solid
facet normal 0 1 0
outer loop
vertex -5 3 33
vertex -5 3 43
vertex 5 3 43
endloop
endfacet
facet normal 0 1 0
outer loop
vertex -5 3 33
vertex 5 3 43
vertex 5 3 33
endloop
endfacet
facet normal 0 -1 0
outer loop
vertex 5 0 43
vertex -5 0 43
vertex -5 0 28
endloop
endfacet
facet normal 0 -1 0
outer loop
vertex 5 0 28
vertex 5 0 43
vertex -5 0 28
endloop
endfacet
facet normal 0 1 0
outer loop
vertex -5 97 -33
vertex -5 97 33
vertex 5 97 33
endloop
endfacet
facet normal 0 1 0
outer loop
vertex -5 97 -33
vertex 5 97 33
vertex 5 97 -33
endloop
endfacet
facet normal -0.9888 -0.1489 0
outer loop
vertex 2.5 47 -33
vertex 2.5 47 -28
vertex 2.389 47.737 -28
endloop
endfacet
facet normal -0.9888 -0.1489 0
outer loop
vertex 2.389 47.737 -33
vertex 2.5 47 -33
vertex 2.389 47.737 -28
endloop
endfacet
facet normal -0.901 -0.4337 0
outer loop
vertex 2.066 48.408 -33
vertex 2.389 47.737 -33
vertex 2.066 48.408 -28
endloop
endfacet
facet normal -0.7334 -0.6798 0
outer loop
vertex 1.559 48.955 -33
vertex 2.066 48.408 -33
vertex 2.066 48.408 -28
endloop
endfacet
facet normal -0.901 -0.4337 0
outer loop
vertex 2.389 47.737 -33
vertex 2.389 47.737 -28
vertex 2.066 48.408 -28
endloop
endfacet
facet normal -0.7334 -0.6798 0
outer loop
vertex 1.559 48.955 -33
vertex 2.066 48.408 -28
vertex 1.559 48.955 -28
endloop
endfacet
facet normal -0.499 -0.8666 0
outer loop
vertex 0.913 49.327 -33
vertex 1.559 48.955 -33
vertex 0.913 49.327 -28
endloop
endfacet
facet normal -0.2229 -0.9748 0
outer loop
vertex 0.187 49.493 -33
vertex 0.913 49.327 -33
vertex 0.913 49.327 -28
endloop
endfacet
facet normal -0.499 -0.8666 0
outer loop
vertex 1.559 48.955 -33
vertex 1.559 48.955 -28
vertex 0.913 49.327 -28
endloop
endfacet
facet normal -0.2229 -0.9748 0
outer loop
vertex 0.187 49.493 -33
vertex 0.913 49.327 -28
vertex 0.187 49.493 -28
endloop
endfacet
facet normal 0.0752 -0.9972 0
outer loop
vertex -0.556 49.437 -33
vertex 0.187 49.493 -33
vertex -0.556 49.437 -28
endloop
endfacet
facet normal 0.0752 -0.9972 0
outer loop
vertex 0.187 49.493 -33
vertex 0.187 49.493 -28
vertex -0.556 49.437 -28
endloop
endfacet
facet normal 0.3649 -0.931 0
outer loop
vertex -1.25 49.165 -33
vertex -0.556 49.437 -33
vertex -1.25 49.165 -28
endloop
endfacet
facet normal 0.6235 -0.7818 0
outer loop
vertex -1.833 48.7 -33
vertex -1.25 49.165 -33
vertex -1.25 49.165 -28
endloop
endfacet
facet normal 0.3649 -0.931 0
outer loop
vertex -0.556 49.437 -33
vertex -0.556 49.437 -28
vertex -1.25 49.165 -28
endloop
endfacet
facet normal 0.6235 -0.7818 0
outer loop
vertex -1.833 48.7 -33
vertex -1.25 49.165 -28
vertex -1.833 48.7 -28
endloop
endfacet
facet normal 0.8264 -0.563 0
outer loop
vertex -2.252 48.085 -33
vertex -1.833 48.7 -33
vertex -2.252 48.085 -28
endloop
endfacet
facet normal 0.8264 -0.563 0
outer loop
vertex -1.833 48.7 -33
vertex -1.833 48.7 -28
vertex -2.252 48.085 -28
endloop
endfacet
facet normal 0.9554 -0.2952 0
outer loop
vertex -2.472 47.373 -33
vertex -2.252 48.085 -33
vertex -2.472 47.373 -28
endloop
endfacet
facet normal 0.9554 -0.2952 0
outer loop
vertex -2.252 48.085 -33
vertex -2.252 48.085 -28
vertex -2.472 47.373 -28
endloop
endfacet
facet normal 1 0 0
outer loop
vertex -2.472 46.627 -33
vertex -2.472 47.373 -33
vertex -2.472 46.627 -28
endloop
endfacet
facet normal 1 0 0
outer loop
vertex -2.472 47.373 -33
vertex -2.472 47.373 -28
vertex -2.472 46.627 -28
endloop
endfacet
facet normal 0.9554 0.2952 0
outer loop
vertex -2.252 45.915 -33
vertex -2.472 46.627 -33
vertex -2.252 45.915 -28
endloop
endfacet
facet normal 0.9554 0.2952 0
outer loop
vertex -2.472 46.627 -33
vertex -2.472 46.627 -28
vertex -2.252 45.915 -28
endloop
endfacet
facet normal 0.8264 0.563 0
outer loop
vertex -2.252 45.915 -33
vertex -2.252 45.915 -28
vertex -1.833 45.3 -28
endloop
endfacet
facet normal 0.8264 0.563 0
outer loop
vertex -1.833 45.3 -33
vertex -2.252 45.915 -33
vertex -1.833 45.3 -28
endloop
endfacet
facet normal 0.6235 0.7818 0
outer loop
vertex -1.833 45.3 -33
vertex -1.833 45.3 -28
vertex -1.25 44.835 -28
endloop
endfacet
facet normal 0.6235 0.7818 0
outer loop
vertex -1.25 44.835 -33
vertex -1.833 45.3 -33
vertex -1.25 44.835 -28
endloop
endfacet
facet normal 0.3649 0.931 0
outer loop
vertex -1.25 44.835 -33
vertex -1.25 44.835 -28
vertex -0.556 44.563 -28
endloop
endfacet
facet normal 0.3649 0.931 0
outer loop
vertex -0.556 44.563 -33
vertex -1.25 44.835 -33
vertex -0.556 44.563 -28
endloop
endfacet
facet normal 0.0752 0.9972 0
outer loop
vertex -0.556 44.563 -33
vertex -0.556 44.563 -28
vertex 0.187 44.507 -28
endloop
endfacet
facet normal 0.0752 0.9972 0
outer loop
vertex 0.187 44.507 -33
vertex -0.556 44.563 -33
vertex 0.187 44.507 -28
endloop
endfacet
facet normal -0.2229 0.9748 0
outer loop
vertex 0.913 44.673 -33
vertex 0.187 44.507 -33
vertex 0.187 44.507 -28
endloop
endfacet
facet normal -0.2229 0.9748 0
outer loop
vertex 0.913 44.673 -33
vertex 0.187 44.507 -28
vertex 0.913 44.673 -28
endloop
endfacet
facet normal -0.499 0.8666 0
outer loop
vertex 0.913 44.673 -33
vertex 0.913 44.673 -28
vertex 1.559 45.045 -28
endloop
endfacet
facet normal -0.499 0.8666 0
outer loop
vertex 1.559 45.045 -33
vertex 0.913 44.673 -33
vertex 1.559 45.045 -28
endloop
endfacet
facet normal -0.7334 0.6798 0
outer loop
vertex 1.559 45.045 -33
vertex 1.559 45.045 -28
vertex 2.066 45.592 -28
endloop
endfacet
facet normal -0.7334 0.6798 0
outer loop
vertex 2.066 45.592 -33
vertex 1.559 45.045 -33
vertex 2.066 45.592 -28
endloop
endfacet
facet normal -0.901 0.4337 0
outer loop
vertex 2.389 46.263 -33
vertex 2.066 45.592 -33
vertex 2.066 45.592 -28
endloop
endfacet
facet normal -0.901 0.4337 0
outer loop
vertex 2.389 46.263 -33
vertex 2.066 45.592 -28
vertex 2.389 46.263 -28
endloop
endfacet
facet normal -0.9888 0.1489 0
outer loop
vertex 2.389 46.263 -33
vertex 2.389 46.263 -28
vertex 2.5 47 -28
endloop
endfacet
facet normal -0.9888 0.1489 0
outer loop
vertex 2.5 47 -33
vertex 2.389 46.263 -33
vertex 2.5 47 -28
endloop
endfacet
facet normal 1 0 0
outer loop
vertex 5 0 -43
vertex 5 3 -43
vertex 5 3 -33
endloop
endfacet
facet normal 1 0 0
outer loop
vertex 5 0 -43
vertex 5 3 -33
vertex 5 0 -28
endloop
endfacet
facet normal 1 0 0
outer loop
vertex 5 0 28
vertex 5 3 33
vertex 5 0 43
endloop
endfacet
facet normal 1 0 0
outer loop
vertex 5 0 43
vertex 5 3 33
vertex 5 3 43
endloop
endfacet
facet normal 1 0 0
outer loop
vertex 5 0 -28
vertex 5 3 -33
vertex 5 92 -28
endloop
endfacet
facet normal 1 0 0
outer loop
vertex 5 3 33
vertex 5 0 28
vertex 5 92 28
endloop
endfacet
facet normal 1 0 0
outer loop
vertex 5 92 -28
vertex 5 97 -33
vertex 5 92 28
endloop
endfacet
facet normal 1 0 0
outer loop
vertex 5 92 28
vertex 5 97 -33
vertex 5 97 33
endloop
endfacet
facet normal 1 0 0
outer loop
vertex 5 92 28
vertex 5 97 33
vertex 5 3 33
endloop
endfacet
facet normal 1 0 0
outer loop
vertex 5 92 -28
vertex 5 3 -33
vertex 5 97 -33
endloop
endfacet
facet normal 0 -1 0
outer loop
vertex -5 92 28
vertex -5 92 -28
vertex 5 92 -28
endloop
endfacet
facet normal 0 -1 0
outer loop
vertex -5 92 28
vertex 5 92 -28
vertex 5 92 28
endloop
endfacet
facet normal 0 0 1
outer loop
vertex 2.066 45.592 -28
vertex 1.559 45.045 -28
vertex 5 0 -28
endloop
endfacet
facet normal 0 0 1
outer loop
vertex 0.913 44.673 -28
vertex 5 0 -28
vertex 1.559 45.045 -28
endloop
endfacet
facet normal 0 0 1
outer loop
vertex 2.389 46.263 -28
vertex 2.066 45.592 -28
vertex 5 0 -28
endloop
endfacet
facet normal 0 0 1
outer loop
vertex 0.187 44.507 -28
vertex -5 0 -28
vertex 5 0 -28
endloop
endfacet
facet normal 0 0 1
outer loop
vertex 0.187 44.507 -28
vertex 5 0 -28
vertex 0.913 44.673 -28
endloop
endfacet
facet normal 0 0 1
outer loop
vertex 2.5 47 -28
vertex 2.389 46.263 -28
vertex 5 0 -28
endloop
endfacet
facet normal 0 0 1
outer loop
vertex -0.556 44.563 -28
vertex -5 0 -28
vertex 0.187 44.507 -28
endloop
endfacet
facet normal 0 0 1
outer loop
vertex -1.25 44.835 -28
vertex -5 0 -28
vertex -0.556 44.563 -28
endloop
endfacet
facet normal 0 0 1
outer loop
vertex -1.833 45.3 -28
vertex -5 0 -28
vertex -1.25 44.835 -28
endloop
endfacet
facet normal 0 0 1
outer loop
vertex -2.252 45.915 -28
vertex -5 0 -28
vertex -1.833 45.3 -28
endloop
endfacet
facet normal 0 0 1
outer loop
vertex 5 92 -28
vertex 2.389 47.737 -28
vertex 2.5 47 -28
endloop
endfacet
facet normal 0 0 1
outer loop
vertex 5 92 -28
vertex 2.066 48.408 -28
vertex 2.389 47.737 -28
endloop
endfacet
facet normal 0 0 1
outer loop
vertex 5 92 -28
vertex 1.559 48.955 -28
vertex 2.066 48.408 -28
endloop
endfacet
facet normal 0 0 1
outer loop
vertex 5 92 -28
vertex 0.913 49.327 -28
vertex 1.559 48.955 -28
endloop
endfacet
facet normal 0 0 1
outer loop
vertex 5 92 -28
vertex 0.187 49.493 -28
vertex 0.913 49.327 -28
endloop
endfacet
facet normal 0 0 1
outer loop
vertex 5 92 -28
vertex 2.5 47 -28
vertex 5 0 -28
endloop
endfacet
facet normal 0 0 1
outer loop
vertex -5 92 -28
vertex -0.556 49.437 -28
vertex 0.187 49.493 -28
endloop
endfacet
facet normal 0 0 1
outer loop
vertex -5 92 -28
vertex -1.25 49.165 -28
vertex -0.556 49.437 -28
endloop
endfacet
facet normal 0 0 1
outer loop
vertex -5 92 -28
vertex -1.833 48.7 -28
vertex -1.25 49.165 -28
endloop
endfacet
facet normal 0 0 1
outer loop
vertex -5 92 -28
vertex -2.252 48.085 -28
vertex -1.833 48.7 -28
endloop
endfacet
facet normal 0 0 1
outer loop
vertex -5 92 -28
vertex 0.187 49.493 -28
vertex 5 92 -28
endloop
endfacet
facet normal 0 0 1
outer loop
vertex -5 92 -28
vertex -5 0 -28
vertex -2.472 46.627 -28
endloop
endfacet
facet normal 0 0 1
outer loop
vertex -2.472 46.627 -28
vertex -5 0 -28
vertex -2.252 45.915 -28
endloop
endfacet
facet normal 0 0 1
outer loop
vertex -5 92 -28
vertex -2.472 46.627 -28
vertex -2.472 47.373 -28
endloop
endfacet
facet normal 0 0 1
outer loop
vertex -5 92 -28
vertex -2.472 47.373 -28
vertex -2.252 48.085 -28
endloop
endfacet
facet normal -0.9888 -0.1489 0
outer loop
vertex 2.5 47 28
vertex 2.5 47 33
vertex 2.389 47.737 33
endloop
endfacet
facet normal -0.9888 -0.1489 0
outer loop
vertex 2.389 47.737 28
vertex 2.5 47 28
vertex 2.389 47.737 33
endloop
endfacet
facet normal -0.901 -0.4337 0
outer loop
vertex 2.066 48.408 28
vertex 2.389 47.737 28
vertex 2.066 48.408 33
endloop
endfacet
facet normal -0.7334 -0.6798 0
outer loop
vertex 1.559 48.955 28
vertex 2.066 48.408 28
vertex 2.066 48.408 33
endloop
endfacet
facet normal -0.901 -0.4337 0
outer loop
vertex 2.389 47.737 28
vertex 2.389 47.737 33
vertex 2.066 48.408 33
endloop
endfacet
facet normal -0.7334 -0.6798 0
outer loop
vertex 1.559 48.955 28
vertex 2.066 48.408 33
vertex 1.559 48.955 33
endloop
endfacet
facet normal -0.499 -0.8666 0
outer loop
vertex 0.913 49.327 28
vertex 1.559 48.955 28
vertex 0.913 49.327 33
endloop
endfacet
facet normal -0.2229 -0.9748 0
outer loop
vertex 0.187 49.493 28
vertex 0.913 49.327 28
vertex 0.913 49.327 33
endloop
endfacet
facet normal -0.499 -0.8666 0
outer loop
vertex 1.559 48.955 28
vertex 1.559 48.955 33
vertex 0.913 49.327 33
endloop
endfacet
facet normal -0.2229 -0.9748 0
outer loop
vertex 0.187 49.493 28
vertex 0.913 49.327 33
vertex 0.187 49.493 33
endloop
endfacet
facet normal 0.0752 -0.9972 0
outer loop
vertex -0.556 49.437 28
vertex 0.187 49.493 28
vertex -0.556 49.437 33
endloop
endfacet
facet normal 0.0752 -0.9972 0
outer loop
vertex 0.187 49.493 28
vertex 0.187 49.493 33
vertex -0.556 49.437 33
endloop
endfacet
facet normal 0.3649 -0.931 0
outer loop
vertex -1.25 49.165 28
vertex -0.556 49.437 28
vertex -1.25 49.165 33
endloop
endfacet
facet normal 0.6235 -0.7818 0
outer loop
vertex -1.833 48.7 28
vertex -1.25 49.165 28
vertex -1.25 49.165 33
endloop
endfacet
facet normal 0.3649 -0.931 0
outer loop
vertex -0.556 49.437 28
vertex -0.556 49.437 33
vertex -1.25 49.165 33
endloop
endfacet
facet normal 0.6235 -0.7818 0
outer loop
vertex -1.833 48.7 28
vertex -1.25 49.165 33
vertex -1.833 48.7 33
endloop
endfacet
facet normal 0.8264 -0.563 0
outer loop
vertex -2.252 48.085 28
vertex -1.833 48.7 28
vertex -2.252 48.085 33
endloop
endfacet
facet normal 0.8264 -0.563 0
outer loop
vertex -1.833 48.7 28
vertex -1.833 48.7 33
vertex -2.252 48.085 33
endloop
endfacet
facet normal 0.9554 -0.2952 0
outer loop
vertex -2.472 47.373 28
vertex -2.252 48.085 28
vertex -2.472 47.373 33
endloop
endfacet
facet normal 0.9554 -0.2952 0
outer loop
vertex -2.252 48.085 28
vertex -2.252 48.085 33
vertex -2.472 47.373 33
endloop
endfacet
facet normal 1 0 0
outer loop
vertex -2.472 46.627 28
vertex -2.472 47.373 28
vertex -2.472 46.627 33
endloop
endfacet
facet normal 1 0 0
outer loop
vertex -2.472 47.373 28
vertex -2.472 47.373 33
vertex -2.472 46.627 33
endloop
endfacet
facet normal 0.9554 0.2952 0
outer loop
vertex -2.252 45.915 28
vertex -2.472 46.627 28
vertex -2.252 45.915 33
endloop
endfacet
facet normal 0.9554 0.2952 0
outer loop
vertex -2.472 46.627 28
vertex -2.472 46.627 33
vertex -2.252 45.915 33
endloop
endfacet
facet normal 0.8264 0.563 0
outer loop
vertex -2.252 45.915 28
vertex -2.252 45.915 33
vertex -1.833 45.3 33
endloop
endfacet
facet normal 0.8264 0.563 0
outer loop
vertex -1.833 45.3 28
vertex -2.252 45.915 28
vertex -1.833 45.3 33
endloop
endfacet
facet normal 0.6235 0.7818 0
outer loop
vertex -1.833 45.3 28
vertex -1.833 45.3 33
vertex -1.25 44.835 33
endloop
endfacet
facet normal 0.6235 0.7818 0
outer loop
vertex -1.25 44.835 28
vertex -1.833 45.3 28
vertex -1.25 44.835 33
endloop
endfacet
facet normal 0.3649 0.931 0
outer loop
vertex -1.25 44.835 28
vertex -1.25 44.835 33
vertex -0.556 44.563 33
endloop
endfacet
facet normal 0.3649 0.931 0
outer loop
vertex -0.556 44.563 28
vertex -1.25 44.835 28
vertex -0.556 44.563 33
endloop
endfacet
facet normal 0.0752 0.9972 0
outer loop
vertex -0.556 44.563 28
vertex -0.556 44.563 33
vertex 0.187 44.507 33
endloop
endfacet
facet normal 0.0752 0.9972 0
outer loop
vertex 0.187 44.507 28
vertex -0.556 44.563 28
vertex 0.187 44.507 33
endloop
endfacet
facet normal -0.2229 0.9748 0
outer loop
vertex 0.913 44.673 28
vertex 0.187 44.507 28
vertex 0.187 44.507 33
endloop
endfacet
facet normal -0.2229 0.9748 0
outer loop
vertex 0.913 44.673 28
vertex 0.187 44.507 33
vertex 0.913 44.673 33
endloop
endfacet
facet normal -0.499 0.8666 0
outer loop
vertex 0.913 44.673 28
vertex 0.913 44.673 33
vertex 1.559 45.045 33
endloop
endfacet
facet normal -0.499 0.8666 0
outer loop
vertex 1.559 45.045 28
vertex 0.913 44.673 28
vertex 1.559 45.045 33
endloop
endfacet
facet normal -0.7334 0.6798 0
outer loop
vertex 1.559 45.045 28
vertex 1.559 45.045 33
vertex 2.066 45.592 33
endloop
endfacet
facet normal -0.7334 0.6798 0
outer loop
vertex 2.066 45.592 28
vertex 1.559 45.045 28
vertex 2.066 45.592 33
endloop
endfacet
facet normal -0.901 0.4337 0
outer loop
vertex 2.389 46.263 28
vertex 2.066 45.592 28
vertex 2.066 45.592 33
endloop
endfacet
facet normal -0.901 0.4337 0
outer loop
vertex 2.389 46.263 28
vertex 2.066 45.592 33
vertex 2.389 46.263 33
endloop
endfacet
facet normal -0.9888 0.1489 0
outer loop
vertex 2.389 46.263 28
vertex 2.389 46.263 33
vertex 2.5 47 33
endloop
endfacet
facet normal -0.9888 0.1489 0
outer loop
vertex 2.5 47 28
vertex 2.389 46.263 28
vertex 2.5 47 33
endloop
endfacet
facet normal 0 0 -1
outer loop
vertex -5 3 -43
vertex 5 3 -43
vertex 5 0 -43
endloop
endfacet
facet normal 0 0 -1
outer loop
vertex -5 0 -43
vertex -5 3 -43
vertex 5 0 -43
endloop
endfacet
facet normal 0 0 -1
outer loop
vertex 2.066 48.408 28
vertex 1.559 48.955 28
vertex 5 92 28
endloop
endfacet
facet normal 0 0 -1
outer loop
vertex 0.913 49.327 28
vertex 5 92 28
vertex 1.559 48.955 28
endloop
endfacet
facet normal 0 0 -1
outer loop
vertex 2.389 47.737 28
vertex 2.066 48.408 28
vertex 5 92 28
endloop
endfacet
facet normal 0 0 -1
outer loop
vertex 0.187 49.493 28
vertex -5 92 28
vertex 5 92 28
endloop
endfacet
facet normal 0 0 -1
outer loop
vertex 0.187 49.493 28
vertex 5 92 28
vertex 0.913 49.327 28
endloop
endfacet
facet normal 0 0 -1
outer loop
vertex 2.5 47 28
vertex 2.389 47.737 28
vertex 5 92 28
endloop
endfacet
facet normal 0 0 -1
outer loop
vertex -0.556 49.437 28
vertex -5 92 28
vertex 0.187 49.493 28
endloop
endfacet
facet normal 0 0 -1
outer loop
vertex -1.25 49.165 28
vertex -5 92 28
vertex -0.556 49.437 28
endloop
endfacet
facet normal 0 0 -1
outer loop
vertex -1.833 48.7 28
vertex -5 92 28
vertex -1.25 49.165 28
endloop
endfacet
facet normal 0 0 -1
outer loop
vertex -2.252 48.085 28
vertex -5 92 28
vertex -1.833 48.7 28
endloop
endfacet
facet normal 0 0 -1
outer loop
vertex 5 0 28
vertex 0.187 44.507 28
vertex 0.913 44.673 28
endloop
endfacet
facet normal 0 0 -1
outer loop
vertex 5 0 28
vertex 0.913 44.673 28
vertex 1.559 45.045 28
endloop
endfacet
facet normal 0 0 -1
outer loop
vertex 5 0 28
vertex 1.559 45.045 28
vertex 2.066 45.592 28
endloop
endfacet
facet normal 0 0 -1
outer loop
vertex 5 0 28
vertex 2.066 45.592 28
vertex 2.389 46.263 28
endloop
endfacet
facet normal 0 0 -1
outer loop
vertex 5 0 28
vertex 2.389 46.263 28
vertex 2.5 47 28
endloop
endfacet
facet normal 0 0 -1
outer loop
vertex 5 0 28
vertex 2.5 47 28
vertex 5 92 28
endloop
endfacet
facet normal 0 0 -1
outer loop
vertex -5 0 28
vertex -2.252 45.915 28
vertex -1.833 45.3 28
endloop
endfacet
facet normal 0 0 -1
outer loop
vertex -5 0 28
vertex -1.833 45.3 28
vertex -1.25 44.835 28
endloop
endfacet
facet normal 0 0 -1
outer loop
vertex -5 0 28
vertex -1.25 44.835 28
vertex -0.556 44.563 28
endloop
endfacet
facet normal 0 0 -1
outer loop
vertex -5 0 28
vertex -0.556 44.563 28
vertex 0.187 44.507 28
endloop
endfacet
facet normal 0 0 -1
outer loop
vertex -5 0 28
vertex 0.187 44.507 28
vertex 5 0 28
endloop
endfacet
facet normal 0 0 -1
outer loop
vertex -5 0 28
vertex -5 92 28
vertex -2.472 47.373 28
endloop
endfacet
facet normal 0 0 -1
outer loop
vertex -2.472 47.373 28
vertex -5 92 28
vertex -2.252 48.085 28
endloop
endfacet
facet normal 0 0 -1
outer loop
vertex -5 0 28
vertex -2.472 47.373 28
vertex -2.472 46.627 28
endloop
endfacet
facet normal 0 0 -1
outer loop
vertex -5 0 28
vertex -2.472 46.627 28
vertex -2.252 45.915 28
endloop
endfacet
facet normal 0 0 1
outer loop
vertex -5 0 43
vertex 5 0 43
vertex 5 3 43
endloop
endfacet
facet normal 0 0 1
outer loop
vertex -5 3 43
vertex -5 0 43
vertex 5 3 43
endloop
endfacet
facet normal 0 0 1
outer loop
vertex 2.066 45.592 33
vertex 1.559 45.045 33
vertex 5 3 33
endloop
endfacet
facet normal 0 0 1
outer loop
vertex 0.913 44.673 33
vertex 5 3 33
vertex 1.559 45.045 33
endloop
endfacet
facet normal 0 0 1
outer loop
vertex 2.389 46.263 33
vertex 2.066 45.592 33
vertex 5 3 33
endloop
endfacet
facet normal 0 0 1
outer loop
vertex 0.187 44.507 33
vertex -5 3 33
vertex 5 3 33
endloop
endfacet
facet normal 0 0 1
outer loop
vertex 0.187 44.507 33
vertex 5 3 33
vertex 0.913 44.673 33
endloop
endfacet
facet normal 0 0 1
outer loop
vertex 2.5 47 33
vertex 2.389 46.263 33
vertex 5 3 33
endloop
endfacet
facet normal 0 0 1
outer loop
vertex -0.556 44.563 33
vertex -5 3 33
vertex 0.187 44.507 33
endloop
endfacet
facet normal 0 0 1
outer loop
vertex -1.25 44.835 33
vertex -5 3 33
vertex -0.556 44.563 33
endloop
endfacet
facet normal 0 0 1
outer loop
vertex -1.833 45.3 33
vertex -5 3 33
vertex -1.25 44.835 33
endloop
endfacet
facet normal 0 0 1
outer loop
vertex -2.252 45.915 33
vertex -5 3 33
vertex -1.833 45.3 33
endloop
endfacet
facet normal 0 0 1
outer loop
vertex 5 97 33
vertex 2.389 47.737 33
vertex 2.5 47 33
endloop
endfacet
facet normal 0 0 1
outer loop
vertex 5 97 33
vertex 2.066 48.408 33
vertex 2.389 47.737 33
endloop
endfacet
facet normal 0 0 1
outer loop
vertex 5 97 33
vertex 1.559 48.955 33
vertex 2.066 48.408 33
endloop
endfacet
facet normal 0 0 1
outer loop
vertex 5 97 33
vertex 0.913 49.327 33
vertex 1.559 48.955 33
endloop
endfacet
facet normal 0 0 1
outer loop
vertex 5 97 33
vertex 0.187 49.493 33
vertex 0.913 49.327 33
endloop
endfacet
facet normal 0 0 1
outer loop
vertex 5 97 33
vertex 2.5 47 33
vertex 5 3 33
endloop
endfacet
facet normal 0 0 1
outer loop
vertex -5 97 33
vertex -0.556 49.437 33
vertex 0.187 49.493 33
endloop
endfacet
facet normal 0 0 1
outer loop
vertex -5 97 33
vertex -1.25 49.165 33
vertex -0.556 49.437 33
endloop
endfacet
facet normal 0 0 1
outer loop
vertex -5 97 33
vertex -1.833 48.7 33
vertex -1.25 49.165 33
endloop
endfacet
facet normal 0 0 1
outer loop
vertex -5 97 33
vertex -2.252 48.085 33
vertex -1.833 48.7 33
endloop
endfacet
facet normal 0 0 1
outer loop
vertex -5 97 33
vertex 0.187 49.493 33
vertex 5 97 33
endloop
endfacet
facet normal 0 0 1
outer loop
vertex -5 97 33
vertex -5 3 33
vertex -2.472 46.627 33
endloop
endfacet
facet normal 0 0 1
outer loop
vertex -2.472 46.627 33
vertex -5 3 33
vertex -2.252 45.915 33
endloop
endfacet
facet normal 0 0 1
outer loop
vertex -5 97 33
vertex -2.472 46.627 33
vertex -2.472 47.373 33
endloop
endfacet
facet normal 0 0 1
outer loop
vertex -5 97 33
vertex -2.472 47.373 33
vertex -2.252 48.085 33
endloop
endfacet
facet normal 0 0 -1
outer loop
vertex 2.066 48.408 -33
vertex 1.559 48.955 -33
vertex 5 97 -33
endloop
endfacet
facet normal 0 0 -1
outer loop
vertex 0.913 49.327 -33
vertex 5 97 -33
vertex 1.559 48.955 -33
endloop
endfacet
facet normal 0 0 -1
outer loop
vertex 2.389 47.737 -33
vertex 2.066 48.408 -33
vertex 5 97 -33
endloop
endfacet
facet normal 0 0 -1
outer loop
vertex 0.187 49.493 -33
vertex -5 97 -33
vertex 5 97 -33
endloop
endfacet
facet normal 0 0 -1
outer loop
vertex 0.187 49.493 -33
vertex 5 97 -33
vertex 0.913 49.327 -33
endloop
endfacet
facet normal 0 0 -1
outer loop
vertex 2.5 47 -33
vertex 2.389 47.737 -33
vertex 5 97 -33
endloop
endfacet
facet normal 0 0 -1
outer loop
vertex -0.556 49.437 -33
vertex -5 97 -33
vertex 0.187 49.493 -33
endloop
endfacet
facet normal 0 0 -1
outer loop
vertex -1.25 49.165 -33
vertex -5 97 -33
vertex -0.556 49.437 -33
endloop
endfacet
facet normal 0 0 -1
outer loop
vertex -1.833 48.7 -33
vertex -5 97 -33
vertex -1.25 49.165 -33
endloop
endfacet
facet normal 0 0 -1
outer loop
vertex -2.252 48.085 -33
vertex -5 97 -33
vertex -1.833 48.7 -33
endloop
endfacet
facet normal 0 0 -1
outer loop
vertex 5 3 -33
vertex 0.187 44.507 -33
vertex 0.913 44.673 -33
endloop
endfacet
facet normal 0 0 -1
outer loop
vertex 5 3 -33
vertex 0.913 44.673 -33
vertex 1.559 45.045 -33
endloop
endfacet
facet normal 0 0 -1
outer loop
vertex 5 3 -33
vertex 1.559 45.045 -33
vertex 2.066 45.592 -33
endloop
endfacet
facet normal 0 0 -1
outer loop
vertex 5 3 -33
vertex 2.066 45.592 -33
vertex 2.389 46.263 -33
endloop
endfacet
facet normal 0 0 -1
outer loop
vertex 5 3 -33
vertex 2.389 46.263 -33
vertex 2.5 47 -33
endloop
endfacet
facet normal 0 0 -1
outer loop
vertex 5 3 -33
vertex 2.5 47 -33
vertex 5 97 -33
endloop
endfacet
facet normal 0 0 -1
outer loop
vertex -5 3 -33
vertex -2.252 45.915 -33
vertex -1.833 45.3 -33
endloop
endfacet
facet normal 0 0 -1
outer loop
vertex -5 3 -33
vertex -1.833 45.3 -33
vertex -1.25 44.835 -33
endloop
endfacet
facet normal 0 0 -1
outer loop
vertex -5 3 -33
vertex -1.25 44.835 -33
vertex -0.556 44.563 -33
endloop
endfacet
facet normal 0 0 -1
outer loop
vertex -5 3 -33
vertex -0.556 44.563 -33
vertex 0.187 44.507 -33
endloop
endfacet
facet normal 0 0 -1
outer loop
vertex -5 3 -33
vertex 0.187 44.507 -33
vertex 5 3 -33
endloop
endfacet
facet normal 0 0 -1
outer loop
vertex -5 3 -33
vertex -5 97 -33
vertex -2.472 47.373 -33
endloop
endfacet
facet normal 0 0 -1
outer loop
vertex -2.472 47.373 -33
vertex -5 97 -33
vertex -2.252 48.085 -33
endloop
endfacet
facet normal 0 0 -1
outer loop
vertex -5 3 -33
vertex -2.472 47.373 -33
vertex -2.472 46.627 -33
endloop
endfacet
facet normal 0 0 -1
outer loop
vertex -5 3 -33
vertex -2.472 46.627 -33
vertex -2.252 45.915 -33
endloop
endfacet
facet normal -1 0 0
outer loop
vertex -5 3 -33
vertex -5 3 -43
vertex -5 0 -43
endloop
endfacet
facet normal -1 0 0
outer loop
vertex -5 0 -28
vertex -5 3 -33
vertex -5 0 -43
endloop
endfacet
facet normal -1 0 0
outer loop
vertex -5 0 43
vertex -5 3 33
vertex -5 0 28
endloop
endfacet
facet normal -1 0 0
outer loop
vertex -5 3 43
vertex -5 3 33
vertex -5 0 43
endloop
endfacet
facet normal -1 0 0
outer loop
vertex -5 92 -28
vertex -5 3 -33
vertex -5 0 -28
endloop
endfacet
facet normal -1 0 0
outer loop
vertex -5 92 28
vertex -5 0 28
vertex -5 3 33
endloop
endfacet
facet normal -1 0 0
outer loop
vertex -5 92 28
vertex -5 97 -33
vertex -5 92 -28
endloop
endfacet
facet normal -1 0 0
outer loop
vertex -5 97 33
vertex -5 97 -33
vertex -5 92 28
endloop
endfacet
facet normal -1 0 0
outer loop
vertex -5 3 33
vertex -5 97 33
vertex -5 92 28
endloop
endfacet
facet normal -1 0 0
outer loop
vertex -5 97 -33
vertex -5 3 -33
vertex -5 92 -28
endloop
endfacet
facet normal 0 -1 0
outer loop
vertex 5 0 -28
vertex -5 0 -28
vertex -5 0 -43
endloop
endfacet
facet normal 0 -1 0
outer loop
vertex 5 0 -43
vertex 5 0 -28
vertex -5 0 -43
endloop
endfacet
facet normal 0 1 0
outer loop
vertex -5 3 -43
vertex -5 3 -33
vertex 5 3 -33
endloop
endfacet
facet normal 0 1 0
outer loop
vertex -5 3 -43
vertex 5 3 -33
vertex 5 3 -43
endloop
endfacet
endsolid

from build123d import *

# Parameters (mm, degrees)
BOSS_EXTRUDE1_DEPTH      = 5
BOSS_EXTRUDE1_DEPTH_BACK = 5
SKETCH2_R                = 2.5
CUT_EXTRUDE1_DEPTH       = 124.328828747


with BuildPart() as part:
    # Sketch1 → Boss-Extrude1 (new, two sides: drawn at the far end of the back side and taken through both)
    with BuildSketch(Plane(origin=(0, 0, 0), x_dir=(0, 0, -1), z_dir=(1, 0, 0)).offset(-BOSS_EXTRUDE1_DEPTH_BACK)):
        Polygon((-33, 3), (-33, 97), (33, 97), (33, 3), (43, 3), (43, 0), (33, 0), (28, 0), (28, 92), (-28, 92), (-28, 0), (-33, 0), (-43, 0), (-43, 3), align=None)
    extrude(amount=BOSS_EXTRUDE1_DEPTH + BOSS_EXTRUDE1_DEPTH_BACK)

    # Sketch2 → Cut-Extrude1 (cut, through all)
    with BuildSketch(Plane.XY.offset(33)):
        with Locations((0, 47)):
            Circle(SKETCH2_R)
    extrude(amount=-CUT_EXTRUDE1_DEPTH, mode=Mode.SUBTRACT)


solid = part.part
